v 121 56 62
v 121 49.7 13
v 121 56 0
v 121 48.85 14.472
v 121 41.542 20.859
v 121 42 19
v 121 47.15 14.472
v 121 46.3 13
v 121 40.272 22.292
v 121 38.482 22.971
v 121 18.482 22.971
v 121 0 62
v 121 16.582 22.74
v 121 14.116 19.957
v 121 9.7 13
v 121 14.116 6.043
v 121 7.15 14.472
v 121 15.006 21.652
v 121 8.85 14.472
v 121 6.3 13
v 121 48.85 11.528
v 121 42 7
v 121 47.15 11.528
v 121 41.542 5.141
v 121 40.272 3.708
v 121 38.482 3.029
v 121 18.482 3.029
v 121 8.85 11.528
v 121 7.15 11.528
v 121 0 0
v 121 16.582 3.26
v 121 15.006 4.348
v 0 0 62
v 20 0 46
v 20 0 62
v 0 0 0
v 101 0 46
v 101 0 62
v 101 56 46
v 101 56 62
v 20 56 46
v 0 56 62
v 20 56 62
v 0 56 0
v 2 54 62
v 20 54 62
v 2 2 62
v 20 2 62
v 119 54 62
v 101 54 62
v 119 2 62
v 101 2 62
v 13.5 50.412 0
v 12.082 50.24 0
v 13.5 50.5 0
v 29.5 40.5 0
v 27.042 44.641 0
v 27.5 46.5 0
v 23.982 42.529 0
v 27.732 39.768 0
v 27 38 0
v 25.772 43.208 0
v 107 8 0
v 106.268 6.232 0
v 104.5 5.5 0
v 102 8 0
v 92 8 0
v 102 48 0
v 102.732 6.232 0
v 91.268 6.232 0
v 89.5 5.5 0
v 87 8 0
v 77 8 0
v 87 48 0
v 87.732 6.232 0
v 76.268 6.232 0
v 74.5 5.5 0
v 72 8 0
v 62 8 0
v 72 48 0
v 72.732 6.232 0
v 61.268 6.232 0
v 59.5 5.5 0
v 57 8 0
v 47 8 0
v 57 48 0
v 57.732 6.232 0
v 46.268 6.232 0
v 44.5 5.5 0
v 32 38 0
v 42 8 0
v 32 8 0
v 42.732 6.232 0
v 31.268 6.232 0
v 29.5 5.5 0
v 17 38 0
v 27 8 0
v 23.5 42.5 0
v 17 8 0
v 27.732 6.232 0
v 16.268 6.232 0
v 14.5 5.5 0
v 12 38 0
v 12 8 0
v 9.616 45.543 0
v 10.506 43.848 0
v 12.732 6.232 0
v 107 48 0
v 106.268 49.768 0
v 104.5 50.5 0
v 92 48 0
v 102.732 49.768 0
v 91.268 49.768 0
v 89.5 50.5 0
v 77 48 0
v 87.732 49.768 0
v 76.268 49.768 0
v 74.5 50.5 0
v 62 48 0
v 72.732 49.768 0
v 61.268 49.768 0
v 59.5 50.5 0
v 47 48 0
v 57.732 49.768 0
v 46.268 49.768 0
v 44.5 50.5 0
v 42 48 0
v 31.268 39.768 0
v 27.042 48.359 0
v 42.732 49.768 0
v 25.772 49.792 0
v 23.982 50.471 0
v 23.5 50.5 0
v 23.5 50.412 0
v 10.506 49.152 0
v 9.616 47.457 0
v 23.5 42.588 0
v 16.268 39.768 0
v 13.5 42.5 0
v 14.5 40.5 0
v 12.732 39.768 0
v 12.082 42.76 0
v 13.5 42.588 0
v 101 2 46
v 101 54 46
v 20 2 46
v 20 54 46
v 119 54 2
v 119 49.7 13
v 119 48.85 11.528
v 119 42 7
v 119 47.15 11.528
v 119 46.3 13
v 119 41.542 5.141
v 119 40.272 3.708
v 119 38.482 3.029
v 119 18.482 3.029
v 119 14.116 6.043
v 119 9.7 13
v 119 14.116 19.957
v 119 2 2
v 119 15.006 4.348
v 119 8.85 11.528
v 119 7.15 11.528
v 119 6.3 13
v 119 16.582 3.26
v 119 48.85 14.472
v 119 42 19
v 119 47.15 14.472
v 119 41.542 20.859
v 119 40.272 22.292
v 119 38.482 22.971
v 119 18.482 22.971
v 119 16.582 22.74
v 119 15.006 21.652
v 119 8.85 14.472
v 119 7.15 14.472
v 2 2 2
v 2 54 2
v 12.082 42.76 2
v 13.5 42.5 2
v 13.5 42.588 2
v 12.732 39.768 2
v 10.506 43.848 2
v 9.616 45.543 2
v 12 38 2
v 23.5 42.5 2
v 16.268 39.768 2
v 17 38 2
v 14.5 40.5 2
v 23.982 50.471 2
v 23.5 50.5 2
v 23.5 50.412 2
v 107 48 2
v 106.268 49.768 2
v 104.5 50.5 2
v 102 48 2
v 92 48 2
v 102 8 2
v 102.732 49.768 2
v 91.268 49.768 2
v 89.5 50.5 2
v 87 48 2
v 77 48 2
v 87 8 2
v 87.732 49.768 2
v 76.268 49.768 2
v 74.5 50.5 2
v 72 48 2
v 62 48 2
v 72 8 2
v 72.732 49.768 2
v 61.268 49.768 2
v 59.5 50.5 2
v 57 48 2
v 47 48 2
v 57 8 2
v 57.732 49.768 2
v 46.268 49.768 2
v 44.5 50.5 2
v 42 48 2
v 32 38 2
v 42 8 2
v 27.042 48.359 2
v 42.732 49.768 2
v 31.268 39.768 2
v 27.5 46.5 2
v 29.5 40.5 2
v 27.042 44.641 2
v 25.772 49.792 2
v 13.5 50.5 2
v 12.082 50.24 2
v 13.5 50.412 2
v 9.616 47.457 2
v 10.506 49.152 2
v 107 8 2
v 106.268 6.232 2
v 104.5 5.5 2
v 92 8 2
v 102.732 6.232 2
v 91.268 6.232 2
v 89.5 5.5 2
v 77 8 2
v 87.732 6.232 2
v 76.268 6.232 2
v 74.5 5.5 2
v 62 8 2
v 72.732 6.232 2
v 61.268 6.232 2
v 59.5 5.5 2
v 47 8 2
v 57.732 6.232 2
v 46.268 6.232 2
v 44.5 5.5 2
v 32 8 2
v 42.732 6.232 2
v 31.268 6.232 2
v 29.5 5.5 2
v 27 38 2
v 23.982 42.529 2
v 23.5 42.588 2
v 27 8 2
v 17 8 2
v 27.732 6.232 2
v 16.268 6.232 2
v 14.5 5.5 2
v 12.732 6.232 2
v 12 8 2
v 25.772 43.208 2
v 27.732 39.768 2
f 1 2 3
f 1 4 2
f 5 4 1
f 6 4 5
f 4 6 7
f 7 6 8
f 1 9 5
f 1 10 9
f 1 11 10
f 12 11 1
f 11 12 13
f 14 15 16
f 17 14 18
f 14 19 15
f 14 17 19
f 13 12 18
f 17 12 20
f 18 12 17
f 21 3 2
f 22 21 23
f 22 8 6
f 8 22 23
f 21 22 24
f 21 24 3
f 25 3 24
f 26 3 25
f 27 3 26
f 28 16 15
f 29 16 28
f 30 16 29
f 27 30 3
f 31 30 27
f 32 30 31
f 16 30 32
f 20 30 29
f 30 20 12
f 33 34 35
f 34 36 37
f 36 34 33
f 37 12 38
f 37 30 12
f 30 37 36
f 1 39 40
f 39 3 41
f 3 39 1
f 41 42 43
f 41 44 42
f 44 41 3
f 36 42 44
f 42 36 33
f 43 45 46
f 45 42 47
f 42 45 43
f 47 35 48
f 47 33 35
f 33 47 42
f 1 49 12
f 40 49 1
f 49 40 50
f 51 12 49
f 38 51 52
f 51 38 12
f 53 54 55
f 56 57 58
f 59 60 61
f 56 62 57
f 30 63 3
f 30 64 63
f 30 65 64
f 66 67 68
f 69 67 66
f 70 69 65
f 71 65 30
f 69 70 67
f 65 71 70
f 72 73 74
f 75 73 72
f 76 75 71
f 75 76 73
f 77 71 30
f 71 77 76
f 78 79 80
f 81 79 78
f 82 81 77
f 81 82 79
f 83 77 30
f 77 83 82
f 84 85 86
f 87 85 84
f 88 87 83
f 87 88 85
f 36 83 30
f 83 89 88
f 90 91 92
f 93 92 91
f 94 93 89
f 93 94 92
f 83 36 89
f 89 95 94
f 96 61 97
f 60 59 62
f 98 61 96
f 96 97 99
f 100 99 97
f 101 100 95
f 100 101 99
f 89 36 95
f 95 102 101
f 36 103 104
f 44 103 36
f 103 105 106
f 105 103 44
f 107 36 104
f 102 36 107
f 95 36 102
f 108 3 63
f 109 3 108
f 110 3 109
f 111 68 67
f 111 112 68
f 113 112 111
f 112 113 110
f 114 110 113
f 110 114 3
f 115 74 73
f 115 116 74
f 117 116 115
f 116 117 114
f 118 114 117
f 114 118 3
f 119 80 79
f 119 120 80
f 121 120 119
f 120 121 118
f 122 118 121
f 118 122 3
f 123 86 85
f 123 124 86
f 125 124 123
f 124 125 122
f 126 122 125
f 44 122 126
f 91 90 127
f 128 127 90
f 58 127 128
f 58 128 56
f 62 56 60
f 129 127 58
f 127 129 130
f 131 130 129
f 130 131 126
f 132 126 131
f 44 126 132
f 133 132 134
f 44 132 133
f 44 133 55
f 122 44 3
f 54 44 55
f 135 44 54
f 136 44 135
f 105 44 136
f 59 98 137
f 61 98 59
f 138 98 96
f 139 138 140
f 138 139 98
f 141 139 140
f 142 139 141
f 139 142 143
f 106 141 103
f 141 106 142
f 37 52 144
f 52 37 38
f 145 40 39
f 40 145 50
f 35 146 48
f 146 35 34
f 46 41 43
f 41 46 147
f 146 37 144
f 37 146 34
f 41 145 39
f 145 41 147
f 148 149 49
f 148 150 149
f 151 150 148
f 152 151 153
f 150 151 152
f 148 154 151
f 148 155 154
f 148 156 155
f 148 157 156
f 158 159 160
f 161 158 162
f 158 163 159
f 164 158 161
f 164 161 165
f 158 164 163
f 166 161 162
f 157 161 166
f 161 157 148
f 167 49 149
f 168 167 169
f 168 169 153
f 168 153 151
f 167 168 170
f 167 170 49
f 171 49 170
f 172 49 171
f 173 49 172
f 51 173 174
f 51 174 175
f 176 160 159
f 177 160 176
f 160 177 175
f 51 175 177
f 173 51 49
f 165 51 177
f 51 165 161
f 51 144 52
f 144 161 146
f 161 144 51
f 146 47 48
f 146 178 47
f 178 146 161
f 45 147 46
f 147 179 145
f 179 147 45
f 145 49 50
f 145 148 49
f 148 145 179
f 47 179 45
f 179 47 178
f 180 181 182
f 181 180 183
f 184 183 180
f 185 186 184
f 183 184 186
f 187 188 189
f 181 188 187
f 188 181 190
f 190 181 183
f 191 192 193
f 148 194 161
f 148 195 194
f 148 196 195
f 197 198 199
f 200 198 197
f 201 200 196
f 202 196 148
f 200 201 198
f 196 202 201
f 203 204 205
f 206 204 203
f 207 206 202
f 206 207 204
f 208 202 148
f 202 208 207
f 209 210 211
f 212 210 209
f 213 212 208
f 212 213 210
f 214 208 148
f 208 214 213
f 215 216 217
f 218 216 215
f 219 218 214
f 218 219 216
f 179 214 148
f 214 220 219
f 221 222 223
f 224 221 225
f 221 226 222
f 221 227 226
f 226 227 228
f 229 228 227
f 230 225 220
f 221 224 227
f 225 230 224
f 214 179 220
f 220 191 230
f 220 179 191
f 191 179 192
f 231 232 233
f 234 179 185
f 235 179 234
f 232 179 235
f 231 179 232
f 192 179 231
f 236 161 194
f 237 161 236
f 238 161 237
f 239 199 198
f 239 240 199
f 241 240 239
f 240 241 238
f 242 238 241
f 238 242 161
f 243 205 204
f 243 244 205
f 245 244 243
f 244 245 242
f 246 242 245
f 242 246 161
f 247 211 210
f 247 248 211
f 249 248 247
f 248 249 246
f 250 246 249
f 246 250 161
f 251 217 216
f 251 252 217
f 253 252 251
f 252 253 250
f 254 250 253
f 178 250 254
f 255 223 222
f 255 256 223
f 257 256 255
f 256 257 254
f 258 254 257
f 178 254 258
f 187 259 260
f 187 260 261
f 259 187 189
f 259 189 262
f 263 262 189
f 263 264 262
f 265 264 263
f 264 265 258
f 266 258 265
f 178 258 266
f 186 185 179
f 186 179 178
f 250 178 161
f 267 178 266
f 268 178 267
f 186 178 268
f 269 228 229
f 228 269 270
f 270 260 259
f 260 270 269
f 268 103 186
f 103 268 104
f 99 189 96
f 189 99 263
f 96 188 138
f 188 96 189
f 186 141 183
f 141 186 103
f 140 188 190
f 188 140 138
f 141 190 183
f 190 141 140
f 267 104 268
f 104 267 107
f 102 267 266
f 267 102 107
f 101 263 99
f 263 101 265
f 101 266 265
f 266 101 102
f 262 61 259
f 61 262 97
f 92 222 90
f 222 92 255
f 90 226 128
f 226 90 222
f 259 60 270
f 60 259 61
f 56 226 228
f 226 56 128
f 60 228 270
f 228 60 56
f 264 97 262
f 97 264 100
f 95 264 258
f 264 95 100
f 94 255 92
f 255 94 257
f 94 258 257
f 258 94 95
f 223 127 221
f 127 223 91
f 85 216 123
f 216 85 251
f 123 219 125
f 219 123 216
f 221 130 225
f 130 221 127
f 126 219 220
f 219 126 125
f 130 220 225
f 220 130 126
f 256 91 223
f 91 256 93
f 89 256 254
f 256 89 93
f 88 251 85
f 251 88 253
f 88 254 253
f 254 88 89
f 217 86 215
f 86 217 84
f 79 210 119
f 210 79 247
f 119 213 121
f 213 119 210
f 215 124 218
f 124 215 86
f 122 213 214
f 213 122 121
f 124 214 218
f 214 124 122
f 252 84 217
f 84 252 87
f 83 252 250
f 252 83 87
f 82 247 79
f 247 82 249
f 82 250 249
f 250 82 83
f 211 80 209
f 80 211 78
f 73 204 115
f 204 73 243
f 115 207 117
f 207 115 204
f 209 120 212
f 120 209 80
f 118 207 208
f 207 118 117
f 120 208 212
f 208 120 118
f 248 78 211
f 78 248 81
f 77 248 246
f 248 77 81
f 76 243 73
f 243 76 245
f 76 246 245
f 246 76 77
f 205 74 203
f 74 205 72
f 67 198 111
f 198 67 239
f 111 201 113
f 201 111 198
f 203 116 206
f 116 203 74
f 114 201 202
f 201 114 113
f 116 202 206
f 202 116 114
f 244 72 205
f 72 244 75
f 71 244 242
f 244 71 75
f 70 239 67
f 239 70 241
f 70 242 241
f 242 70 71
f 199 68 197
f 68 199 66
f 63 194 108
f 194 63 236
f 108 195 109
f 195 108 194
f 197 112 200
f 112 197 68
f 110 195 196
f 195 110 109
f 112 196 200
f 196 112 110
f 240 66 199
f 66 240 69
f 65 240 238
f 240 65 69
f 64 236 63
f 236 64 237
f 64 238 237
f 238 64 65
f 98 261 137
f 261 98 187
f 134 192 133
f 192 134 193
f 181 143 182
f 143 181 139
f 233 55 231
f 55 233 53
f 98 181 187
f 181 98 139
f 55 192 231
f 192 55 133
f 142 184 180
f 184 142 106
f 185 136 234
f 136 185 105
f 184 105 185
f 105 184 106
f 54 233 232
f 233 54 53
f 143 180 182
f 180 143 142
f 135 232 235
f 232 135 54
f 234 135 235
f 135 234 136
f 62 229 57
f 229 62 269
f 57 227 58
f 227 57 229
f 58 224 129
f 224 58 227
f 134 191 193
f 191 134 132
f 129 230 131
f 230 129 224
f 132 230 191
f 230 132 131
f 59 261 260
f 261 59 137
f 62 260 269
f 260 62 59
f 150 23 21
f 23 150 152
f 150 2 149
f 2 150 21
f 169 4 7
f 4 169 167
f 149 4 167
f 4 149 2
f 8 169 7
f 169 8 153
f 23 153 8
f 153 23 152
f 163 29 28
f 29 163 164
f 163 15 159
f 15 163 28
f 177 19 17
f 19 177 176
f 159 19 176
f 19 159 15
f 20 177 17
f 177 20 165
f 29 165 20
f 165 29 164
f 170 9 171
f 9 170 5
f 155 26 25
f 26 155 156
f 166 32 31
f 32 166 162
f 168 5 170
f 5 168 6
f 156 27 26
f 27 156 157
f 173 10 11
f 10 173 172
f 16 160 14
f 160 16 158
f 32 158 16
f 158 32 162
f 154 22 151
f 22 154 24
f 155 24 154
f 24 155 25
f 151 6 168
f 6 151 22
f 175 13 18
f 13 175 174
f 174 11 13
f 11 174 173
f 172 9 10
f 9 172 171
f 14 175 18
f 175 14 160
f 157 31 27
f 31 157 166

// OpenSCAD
WALL = 2;
PSU_CLEARANCE = 2;
PSU_WIDTH = 115 + PSU_CLEARANCE;
PSU_HEIGHT = 50 + PSU_CLEARANCE;
PSU_DEPTH = 200;

COVER_WIDTH = PSU_WIDTH + (2 * WALL);
COVER_HEIGHT = PSU_HEIGHT + (2 * WALL);
COVER_DEPTH = 60 + WALL;
COVER_INNER_DEPTH= 45 + WALL;
COVER_SUPPORT_WIDTH = 20;

VENT_HEIGHT = 45;
VENT_WIDTH = 5;
VENT_DISTANCE = 15;

CABLE_SLOT_WIDTH = 8;
CABLE_SLOT_HEIGHT = 18;
CABLE_SLOT_Y_OFFSET = 40;
CABLE_SLOT_VENT_DISTANCE = 2;

POWER_SOCKET_OFFSET = 13;
POWER_SWITCH_OFFSET = 20;

SCREW_HOLE_HEIGHT = 12;
SCREW_HOLE_WIDTH = 5;
SCREW_HOLE_Z_OFFSET = 12.5;
SCREW_HOLE_Y_OFFSET = 45.5;


module cover() {
  difference() 
{
    cube([COVER_WIDTH, COVER_DEPTH, COVER_HEIGHT]);
    translate([COVER_SUPPORT_WIDTH, COVER_INNER_DEPTH-1, -1]) {
      cube([COVER_WIDTH - (2 * COVER_SUPPORT_WIDTH), COVER_DEPTH - COVER_INNER_DEPTH+2, COVER_HEIGHT+2]);
    }
    translate([WALL, WALL, WALL]) {
      cube([PSU_WIDTH, PSU_DEPTH, PSU_HEIGHT]);
    }
  }
}

module vents() {
  for (x = [ WALL + VENT_DISTANCE : VENT_DISTANCE : COVER_WIDTH - WALL ]) {
    translate([x, WALL, (COVER_HEIGHT - VENT_HEIGHT) / 2]) {
      rotate([0, -90, 90]) {
        if (x < CABLE_SLOT_HEIGHT + WALL + VENT_DISTANCE) {
          translate([CABLE_SLOT_WIDTH + CABLE_SLOT_VENT_DISTANCE, 0, 0]) {         
            slot(VENT_WIDTH, VENT_HEIGHT - CABLE_SLOT_WIDTH - CABLE_SLOT_VENT_DISTANCE, 2 * WALL);
          }
        } else {
          slot(VENT_WIDTH, VENT_HEIGHT, 2 * WALL);
        }
      }
    }
  }

}

module slot(width, height, depth) {
  translate([width / 2, 0, -.1]) {
    union() {
      cube([height - width, width, depth]);
      translate([0, width / 2, 0]) {
        cylinder(h = depth, r = width / 2);
      }
      translate([height - width, width / 2, 0]) {
        cylinder(h = depth, r = width / 2);
      }
    }
  }
}

module powerSocket() {
  translate([WALL + 2 + COVER_WIDTH, POWER_SOCKET_OFFSET, 0.5 * COVER_HEIGHT]) {
    rotate([0, 90, 0]) {
      translate([20,0,-5]) cylinder(r=1.7, h=22, center=true);
      translate([-20,0,-5]) cylinder(r=1.7, h=22, center=true);
      hull() {
        minkowski() {
          cube([20.5,12.5,3], center=true);
          cylinder(r=5,h=0.1);
        }
        translate([20,0,0]) cylinder(r=5, h=3, center=true);
        translate([-20,0,0]) cylinder(r=5, h=3, center=true);
      }
      translate([0,0,-5.5 - 1.5])
        minkowski() {
          cube([20,12,11], center=true);
          cylinder(r=4,h=0.1);
      }
    }
  }
}

module powerSwitch() {
  translate([COVER_WIDTH / 2, POWER_SWITCH_OFFSET, COVER_HEIGHT + 2]) {
    rotate([0, 0, -90]) {
	  cube([14.8,20.8,2], center=true);
	  translate([0,0,-7-1]) cube([13,19.8,14], center=true);
    }
  }
}

module cableSlot() {
  translate([WALL + VENT_DISTANCE / 2, WALL, (COVER_HEIGHT - VENT_HEIGHT) / 2]) {
    rotate([90, 0, 0]) {
      slot(CABLE_SLOT_WIDTH, CABLE_SLOT_HEIGHT, WALL * 2);
    }
  }
}

module screwHoles() {
  translate([-2.5, SCREW_HOLE_Y_OFFSET + WALL - SCREW_HOLE_HEIGHT, SCREW_HOLE_Z_OFFSET + WALL + PSU_CLEARANCE / 2 - SCREW_HOLE_WIDTH / 2]) {
    rotate([90, 0, 90]) {
      slot(SCREW_HOLE_WIDTH, SCREW_HOLE_HEIGHT, COVER_WIDTH + 5);
    }
  }

  translate([-2.5, SCREW_HOLE_Y_OFFSET + WALL - SCREW_HOLE_HEIGHT, COVER_HEIGHT - SCREW_HOLE_Z_OFFSET - SCREW_HOLE_WIDTH - WALL - PSU_CLEARANCE / 2 + SCREW_HOLE_WIDTH / 2]) {
    rotate([90, 0, 90]) {
      slot(SCREW_HOLE_WIDTH, SCREW_HOLE_HEIGHT, COVER_WIDTH + 5);
    }
  }
}

translate([0, COVER_HEIGHT, 0]) rotate([90, 0, 0]) {
  difference() {
    cover();
    vents();
    cableSlot();
    powerSocket();
//    powerSwitch();
//    screwHoles();
  }
}
